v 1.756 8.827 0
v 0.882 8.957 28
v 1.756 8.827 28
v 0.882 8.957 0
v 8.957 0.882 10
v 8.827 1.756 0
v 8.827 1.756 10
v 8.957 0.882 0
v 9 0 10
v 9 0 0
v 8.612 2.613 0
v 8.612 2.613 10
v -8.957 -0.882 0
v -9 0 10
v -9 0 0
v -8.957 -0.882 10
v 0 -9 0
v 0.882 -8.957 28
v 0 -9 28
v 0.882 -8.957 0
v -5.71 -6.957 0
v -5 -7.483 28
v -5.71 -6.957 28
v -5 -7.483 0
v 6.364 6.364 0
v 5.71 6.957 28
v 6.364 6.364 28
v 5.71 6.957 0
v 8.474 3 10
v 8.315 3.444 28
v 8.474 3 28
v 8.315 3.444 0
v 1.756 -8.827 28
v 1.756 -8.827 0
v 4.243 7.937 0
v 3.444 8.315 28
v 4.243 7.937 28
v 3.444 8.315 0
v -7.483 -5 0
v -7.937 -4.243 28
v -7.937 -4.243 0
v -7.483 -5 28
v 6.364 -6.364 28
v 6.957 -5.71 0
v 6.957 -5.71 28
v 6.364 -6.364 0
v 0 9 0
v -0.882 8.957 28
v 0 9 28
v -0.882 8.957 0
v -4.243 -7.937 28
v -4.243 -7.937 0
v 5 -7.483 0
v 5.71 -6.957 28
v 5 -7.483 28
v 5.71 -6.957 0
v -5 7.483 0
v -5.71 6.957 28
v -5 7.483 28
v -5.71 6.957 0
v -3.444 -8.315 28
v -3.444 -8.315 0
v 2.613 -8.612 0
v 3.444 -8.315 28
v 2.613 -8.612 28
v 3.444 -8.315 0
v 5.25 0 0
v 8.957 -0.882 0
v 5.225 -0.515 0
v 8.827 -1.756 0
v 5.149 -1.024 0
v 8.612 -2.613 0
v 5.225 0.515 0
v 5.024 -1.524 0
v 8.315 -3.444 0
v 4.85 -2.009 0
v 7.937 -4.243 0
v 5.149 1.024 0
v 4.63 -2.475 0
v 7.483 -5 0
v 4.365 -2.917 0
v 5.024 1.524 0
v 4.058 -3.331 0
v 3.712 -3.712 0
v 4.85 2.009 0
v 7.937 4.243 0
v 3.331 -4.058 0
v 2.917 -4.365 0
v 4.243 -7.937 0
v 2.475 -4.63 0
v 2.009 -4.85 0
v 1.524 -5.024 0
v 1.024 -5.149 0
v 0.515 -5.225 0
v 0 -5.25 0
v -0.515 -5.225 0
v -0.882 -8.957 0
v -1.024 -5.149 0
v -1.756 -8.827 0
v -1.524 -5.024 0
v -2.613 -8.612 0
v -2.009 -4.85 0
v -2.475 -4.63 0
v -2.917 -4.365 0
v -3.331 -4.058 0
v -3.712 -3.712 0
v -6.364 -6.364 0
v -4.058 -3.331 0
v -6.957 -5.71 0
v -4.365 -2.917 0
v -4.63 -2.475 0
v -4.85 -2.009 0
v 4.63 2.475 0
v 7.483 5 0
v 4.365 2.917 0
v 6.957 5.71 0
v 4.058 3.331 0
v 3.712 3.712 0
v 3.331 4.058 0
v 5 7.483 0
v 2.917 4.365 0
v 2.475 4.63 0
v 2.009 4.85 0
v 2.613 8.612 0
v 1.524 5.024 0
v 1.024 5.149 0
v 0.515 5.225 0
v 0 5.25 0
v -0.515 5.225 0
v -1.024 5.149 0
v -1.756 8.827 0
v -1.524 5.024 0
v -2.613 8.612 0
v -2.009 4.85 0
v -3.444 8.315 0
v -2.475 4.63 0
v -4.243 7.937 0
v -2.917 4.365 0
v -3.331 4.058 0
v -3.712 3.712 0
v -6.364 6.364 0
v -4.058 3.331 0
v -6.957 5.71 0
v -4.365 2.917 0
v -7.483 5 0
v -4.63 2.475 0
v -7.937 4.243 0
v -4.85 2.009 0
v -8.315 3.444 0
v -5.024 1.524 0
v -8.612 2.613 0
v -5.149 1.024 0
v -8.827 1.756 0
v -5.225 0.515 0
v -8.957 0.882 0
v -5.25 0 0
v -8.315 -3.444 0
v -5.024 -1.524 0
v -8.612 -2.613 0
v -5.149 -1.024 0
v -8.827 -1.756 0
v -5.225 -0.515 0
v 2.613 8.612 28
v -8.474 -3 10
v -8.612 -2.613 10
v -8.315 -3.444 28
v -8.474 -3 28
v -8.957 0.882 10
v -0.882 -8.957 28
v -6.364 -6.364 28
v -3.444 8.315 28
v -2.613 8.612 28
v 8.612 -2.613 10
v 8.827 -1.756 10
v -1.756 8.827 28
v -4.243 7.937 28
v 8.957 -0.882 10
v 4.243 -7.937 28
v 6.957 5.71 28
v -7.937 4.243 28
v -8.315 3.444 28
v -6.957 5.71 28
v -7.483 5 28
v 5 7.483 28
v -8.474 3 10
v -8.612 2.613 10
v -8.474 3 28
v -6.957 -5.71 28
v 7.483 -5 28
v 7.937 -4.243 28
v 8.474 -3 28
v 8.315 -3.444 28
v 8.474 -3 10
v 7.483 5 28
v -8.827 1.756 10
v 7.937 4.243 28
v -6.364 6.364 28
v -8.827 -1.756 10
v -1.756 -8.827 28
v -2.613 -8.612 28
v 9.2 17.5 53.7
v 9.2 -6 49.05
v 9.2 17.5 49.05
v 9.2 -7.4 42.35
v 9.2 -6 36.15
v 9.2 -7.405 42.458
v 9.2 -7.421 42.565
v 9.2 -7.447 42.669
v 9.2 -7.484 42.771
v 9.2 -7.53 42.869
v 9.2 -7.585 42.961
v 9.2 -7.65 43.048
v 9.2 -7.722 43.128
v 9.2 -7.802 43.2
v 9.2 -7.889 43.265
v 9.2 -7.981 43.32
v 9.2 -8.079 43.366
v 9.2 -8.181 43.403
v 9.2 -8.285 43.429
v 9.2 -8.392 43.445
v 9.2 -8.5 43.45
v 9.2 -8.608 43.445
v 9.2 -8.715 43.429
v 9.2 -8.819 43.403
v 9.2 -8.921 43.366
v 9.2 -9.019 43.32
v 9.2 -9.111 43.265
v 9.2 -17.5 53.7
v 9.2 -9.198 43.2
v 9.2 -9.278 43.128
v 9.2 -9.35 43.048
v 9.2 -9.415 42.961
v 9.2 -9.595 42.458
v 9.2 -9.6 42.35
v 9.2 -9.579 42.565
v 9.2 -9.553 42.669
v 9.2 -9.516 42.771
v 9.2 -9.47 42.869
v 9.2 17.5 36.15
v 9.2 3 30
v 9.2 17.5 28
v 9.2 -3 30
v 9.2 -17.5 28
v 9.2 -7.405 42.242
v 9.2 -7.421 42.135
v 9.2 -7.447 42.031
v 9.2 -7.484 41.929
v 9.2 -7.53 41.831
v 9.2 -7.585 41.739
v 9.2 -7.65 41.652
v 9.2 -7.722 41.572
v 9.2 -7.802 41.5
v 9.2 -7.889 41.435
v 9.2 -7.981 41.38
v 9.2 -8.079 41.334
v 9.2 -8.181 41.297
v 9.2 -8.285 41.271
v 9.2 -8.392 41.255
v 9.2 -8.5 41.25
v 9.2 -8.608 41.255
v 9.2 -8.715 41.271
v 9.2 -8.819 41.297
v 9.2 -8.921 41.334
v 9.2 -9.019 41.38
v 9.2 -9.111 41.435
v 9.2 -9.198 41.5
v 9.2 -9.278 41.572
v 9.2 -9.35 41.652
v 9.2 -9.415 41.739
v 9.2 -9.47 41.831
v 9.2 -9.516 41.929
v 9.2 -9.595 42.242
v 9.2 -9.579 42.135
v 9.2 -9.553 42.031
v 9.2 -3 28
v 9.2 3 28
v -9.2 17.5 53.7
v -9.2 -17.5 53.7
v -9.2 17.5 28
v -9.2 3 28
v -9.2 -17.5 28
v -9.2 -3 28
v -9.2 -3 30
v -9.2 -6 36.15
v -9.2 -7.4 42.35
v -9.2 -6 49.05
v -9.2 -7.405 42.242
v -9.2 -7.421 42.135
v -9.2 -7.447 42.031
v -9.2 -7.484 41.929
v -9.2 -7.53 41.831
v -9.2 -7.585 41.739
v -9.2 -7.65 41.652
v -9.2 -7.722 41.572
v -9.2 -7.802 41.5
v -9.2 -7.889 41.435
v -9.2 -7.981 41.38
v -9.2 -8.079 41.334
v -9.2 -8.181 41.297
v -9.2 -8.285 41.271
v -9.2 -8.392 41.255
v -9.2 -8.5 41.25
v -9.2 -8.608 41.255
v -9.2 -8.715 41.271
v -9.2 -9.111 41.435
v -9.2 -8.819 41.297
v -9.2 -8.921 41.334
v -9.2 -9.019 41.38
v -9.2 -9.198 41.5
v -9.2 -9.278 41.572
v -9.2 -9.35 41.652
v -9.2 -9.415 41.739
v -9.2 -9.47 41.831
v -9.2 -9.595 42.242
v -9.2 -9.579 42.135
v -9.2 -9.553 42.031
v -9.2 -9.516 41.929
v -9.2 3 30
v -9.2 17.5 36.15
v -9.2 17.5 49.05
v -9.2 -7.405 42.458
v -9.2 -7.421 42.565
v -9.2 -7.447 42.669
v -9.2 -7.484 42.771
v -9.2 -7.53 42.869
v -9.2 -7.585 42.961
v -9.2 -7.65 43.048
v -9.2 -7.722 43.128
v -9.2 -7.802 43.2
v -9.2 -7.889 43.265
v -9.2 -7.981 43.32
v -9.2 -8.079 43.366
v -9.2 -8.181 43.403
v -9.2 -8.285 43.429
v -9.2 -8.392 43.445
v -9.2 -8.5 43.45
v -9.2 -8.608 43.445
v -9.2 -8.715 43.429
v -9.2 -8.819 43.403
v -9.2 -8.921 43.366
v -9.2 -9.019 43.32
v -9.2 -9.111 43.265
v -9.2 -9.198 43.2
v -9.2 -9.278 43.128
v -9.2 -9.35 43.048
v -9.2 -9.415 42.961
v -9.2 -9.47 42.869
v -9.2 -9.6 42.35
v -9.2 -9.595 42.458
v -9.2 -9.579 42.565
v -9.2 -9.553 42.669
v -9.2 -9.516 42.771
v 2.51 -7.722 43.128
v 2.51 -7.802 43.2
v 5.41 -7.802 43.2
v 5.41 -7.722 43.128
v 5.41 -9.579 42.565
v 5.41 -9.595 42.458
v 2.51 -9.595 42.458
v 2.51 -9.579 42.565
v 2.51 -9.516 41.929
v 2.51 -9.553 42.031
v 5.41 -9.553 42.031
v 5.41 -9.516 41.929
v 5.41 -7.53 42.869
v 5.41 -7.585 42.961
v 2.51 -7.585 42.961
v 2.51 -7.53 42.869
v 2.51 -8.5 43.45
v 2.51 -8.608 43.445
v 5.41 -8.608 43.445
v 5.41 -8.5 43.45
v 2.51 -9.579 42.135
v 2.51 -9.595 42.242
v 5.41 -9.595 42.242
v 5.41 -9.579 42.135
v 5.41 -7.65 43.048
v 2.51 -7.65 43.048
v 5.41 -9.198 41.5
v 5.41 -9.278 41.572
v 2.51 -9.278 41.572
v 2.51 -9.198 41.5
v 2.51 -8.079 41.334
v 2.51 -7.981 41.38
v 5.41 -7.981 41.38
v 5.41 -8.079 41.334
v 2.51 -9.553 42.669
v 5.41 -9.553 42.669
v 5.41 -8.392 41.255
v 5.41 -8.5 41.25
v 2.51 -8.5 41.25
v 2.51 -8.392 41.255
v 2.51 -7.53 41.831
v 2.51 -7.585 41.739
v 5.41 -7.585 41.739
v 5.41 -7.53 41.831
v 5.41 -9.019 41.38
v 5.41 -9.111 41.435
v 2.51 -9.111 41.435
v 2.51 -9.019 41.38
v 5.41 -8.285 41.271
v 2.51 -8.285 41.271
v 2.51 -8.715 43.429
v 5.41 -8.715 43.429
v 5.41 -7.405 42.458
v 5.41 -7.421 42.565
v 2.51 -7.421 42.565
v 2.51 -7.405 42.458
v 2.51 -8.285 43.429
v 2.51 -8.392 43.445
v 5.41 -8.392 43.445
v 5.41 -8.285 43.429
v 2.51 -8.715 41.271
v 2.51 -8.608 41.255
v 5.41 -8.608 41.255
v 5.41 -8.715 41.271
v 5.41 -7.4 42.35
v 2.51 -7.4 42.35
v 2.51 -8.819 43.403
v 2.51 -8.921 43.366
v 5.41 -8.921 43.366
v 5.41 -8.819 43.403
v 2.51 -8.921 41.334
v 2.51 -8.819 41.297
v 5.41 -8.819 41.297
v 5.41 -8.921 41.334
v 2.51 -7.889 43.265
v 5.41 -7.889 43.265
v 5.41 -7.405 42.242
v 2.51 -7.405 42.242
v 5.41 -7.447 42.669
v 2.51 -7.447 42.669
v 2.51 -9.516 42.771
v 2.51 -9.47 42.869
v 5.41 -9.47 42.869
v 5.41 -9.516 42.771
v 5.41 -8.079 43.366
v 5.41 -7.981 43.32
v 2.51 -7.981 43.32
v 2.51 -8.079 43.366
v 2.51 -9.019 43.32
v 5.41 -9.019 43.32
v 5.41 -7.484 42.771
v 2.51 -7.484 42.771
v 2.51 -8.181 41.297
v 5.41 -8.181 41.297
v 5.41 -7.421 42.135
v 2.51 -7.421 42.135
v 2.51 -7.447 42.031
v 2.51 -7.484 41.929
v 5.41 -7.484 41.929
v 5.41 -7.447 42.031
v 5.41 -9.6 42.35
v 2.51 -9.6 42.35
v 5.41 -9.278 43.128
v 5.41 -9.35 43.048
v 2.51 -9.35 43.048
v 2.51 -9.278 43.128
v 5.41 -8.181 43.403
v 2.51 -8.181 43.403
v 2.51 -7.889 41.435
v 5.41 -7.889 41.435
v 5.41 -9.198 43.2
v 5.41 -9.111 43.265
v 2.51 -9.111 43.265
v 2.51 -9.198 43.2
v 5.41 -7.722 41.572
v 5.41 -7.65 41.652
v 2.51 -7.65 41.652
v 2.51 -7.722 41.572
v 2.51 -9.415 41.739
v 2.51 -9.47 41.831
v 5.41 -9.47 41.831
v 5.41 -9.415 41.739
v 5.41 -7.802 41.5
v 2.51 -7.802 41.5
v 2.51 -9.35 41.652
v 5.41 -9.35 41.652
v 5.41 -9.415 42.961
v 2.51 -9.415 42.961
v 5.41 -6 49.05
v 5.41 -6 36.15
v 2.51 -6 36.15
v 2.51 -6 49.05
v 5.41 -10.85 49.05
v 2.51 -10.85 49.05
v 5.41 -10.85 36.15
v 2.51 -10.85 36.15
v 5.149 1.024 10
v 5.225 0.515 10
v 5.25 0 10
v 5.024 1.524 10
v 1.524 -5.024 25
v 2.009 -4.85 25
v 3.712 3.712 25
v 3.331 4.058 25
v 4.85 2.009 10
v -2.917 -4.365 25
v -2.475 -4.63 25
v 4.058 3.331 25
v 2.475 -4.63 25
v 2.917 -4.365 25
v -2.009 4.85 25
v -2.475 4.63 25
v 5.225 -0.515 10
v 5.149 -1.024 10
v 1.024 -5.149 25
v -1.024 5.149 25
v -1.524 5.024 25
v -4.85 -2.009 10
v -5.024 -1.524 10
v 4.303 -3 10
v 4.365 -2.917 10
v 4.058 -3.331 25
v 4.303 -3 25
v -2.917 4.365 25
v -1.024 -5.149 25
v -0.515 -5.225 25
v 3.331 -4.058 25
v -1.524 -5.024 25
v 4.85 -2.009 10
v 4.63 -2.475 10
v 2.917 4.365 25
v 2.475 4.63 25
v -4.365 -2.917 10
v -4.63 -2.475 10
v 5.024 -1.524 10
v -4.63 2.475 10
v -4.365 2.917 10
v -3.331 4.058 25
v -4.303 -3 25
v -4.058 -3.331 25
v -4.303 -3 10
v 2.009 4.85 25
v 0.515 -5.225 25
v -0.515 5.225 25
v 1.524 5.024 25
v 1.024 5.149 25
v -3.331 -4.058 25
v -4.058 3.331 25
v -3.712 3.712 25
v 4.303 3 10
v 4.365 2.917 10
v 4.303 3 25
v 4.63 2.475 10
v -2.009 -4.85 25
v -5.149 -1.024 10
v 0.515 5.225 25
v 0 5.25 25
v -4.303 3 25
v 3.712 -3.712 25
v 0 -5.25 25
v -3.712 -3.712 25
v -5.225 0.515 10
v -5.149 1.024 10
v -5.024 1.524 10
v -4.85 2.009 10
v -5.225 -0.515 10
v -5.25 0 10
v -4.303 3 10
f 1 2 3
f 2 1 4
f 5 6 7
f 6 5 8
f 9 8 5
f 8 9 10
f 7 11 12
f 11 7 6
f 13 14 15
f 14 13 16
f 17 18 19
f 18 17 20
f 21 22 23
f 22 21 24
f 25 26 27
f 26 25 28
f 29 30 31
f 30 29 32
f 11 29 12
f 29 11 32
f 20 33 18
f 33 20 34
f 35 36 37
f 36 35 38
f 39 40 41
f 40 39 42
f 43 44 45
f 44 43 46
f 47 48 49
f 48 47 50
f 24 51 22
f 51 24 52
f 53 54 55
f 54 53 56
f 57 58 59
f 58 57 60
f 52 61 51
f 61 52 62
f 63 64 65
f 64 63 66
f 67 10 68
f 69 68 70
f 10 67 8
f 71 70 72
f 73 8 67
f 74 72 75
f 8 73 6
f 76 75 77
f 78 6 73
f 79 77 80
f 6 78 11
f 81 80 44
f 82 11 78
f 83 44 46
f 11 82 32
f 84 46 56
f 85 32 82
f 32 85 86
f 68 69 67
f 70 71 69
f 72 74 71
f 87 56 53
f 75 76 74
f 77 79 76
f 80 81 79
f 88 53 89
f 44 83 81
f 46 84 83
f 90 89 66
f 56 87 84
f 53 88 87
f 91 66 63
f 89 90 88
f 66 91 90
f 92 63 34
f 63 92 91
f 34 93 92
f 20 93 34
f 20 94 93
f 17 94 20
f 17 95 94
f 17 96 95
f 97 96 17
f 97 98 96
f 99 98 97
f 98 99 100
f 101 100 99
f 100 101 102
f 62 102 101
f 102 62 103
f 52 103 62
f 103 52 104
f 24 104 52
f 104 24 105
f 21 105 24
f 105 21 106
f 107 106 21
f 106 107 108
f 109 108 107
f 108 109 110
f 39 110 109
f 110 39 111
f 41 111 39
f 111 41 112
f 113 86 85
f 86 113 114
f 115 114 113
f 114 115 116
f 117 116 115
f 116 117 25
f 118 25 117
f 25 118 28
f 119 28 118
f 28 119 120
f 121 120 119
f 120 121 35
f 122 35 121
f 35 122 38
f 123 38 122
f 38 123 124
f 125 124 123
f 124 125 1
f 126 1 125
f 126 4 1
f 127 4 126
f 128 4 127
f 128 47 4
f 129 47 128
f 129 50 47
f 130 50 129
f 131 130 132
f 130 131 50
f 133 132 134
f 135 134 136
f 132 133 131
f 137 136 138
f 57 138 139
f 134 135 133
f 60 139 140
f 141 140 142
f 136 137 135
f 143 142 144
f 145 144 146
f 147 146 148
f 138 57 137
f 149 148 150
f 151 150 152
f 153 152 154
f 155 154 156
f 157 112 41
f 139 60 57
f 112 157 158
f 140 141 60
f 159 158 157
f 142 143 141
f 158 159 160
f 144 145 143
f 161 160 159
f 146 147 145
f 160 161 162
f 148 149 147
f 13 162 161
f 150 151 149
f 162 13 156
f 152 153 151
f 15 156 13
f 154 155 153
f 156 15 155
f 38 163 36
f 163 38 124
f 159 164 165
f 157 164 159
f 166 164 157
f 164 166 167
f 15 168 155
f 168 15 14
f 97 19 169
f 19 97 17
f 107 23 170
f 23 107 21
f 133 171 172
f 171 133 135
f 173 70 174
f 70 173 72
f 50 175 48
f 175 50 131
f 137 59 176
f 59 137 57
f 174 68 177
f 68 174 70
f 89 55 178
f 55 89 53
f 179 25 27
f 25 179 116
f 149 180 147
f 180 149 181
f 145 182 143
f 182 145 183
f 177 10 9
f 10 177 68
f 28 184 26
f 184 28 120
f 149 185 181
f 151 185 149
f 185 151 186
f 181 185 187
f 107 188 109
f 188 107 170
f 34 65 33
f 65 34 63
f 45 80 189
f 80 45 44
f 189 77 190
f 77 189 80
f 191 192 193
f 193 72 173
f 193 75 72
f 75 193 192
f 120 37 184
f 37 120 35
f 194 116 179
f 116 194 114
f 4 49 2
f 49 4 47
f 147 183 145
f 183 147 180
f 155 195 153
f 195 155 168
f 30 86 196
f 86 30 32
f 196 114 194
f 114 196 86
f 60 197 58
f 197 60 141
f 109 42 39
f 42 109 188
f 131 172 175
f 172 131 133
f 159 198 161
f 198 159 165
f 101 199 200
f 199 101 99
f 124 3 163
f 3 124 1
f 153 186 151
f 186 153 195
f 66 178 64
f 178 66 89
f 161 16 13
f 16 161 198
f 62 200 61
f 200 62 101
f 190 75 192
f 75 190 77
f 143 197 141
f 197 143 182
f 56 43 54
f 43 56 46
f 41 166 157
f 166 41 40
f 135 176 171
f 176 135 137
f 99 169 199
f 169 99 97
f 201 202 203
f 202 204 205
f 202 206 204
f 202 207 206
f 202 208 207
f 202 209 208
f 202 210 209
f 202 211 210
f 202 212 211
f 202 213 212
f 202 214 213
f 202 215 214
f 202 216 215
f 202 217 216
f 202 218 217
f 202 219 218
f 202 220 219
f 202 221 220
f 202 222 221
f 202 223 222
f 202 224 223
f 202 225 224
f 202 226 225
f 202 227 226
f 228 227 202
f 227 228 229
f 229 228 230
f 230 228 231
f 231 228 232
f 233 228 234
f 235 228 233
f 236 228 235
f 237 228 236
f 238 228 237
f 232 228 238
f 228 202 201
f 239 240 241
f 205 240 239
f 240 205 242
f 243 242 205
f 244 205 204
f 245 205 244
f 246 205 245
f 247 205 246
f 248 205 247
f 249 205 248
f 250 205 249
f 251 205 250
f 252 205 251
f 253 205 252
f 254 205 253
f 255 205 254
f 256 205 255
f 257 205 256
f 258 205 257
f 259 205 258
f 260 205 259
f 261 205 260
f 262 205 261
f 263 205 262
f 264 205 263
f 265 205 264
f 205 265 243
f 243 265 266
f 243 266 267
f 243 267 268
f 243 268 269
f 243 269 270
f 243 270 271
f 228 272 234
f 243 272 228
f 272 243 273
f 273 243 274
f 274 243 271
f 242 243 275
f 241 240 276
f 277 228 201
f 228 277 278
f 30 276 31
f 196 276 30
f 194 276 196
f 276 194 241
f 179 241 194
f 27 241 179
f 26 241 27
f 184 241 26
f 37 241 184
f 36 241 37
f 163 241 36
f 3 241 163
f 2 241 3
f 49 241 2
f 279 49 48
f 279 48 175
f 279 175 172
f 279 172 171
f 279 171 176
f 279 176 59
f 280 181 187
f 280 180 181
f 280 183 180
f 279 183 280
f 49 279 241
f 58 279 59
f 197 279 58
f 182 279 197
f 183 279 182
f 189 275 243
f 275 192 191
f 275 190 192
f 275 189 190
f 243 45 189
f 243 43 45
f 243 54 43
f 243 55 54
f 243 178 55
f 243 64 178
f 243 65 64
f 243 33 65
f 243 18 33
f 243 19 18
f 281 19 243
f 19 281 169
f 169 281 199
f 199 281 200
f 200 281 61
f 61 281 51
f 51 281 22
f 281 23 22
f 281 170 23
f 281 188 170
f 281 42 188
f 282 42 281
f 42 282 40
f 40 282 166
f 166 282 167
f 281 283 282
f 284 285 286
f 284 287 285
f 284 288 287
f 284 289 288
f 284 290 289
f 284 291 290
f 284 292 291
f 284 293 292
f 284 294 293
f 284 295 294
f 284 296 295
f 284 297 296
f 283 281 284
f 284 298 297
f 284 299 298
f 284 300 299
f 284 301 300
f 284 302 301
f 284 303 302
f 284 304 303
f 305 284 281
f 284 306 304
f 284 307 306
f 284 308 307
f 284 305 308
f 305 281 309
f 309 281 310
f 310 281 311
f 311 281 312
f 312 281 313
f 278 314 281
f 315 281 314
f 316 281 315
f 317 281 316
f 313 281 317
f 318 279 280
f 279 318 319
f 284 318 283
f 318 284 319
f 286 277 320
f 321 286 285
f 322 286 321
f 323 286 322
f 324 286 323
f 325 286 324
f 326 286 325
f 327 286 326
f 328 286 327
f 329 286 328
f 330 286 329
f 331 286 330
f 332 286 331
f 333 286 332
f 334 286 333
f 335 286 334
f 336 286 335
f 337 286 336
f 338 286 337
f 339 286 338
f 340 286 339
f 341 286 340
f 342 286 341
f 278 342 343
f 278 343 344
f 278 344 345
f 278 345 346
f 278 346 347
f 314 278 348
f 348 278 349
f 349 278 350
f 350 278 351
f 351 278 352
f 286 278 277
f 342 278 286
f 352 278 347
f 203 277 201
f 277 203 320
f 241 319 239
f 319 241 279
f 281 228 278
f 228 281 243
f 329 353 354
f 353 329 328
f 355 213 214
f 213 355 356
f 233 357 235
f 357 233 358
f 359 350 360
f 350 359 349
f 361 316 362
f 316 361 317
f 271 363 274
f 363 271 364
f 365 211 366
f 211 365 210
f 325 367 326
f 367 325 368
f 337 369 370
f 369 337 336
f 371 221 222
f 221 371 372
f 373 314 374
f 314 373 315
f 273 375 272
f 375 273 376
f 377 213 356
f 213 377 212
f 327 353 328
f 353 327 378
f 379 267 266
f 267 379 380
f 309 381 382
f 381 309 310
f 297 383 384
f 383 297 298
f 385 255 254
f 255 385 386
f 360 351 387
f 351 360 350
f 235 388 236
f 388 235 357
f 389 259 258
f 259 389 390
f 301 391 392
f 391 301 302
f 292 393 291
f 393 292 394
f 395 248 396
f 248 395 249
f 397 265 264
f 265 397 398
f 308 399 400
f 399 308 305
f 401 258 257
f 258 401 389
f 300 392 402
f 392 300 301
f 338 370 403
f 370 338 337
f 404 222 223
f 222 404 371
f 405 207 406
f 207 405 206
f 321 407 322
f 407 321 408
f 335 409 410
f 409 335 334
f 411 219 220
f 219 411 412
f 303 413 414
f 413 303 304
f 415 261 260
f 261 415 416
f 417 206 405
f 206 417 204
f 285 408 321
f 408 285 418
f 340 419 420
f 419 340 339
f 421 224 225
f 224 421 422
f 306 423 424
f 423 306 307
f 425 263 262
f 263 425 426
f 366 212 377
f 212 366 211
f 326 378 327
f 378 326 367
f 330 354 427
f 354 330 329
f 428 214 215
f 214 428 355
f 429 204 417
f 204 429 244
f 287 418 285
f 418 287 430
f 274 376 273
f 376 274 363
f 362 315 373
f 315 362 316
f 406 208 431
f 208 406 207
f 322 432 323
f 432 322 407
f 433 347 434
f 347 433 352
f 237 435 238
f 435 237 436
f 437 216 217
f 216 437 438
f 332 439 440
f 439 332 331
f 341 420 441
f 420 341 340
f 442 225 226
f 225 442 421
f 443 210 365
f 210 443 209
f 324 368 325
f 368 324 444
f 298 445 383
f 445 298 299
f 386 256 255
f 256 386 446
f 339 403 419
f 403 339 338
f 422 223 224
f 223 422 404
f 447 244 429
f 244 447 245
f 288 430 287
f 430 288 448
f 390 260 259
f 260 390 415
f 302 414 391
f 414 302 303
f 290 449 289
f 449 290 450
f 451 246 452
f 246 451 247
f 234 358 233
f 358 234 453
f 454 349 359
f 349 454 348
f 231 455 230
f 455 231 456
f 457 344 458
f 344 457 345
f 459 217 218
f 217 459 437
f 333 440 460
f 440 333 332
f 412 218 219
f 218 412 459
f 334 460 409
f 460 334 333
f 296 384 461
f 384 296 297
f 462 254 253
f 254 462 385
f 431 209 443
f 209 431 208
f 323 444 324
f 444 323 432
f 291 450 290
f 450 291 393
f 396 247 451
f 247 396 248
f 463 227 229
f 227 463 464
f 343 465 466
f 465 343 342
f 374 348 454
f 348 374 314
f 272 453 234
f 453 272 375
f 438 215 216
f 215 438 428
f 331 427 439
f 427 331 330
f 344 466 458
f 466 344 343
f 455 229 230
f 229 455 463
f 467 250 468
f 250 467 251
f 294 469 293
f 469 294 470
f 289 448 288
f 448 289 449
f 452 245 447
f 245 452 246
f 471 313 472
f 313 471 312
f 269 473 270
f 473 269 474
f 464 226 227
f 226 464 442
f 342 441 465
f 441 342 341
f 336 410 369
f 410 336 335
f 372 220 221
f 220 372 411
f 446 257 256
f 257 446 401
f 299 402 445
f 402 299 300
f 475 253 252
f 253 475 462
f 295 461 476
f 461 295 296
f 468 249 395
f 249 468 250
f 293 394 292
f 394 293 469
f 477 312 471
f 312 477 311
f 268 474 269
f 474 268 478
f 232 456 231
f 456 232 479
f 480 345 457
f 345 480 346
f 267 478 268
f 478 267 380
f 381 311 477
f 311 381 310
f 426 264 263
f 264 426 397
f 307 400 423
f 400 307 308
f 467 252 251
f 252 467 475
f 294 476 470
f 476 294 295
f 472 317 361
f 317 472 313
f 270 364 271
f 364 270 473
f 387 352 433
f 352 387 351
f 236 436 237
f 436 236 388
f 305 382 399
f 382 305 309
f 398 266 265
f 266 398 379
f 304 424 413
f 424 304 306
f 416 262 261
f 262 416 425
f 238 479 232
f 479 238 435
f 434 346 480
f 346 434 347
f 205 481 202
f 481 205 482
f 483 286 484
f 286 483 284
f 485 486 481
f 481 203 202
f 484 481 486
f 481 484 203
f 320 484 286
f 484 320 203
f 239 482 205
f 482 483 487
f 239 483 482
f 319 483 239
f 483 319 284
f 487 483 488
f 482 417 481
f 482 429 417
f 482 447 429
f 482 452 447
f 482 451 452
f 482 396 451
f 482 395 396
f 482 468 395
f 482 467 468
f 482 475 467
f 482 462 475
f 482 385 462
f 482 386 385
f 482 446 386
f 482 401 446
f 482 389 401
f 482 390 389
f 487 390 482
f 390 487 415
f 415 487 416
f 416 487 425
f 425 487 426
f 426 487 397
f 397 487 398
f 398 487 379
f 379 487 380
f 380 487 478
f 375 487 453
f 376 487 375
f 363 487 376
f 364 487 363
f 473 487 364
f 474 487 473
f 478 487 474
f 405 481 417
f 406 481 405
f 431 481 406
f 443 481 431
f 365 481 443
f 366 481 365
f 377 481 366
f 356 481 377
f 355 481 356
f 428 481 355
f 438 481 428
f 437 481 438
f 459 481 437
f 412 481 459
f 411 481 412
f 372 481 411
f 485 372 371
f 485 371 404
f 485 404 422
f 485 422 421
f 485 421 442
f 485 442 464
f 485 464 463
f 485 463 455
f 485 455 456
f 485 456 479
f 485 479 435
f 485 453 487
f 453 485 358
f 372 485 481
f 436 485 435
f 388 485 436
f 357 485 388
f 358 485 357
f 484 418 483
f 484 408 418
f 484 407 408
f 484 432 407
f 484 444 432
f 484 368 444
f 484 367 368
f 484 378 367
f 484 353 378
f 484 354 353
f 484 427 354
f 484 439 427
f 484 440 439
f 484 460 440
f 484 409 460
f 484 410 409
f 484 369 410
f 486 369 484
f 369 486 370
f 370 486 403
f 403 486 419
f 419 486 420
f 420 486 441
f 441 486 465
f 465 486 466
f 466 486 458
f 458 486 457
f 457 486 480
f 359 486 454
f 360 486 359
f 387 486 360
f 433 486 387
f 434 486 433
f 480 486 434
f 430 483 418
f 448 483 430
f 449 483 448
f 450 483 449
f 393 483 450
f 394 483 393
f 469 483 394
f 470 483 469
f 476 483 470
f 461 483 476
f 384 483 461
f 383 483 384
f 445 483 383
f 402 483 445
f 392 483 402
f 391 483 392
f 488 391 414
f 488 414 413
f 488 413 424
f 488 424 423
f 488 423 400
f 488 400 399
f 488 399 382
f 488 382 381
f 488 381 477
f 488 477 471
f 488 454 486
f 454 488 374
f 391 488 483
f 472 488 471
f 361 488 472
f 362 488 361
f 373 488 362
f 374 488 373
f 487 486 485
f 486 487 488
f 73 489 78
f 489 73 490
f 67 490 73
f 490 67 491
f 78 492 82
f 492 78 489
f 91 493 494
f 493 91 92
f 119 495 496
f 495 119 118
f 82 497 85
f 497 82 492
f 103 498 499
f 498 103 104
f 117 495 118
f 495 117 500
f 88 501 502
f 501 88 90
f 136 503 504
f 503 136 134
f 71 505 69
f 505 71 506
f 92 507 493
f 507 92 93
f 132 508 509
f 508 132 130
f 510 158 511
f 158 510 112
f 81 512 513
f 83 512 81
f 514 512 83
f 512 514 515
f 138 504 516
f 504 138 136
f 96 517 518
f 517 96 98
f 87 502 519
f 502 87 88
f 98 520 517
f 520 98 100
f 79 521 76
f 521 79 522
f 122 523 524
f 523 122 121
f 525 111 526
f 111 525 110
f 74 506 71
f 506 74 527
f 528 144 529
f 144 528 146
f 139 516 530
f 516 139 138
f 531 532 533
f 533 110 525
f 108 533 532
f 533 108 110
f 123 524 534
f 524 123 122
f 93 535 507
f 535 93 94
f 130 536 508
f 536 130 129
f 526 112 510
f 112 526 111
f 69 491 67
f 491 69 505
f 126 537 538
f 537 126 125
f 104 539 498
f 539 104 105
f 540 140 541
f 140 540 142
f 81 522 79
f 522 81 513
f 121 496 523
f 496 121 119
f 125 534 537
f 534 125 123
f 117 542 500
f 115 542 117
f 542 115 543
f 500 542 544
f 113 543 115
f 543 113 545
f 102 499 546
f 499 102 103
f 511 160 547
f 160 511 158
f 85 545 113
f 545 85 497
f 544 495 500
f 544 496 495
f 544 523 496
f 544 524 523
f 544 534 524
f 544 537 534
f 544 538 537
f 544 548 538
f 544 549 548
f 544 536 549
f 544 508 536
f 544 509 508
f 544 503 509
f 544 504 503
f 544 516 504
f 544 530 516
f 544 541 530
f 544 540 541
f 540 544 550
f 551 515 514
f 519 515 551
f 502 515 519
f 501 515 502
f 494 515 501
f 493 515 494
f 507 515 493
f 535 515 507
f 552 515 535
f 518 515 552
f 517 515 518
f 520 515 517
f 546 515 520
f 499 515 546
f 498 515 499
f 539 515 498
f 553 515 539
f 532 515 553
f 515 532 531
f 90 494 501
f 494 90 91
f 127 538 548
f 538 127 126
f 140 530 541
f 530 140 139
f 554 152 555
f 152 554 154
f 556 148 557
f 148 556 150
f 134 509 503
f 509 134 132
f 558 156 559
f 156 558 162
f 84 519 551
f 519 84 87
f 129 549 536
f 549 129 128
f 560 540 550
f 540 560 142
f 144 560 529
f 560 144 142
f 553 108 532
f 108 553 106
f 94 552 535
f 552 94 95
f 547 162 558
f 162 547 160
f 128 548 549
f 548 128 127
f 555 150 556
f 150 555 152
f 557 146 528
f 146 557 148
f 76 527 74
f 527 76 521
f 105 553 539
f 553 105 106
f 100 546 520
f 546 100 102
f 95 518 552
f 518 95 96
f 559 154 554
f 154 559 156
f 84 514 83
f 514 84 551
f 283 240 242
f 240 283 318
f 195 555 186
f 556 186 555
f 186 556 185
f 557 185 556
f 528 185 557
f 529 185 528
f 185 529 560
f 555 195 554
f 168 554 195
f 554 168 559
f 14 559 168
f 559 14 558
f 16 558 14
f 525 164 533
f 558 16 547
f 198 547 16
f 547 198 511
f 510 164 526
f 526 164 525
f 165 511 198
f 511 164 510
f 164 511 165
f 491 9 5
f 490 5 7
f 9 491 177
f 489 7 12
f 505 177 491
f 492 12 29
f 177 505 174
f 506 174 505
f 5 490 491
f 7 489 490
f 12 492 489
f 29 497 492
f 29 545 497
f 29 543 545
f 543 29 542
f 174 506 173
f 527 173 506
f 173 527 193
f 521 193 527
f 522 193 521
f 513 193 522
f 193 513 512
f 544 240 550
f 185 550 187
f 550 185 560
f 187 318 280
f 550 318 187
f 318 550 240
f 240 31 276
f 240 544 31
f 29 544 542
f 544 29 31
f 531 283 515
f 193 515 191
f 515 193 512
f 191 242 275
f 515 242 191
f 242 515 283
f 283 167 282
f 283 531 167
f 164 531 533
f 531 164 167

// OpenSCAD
// file: params.scad
// ============================================================================
// Ombrellone magico - mini prototipo 1:10 - parametri condivisi (mm)
// Apri i singoli file con OpenSCAD (https://openscad.org), F6 e esporta STL.
// ============================================================================
$fn = 64;

// --- geometria del modello (scala 1:10 del progetto base) ------------------
pole_h      = 200;    // altezza palo fisso (dalla base alla cerniera di inclinazione)
arm_l       = 160;    // lunghezza braccio (dalla cerniera al centro testa)
canopy_r    = 150;    // raggio tettuccio
canopy_off  = 50;     // sbalzo del tettuccio lungo il braccio (fisso nel mini)

// --- tubi in carbonio (aste da aquilone) -----------------------------------
pole_tube_d = 10;     // diametro esterno tubo palo
arm_tube_d  = 8;      // diametro esterno tubo braccio
spoke_d     = 2;      // stecche tettuccio
fit         = 0.25;   // gioco per gli accoppiamenti stampati (0.2-0.35 a seconda della stampante)

// --- servo ------------------------------------------------------------------
// MG996R / DS3218 (standard): corpo 40.5 x 20 x 38 mm, flangia 54.5 mm, fori a 49 mm
sv_std_l = 40.7; sv_std_w = 20.2; sv_std_h = 38; sv_std_tab = 54.7; sv_std_hole = 49; sv_std_tab_t = 2.6;
// SG90 / MG90S (micro): corpo 22.8 x 12.2 x 22.5 mm, flangia 32.5 mm, fori a 28 mm
sv_mic_l = 23.0; sv_mic_w = 12.4; sv_mic_h = 22.7; sv_mic_tab = 32.7; sv_mic_hole = 28; sv_mic_tab_t = 2.4;
horn_std_d = 21;      // squadretta rotonda MG996R
horn_mic_d = 20;      // squadretta rotonda SG90 (a croce: 20 mm)

// --- cuscinetto ralla (lazy susan) ------------------------------------------
turntable_d = 300;    // disco piattaforma demo (compensato/forex 5 mm, tagliato a mano)
bearing_d   = 200;    // lazy susan 200 mm

wall = 3;

// tasca per servo standard (asse Z verso l'alto, albero in origine)
module servo_std_pocket(extra=10) {
    translate([-sv_std_l/2 + 10 - 1, -sv_std_w/2, -sv_std_h]) cube([sv_std_l + fit*2, sv_std_w + fit*2, sv_std_h + extra]);
    // flange
    translate([-sv_std_tab/2 + 10 - 1, -sv_std_w/2, -sv_std_h + 27]) cube([sv_std_tab, sv_std_w + fit*2, sv_std_tab_t + 0.5]);
    for (x = [-sv_std_hole/2, sv_std_hole/2]) translate([x + 10 - 1, 0, -sv_std_h]) cylinder(d = 3.2, h = sv_std_h + extra);
}
// tasca per micro servo (asse Z verso l'alto, albero in origine: l'albero e' a 6 mm da un'estremita')
module servo_mic_pocket(extra=10) {
    translate([-sv_mic_l/2 + 5.5, -sv_mic_w/2, -sv_mic_h]) cube([sv_mic_l + fit*2, sv_mic_w + fit*2, sv_mic_h + extra]);
    translate([-sv_mic_tab/2 + 5.5, -sv_mic_w/2, -sv_mic_h + 16]) cube([sv_mic_tab, sv_mic_w + fit*2, sv_mic_tab_t + 0.5]);
    for (x = [-sv_mic_hole/2, sv_mic_hole/2]) translate([x + 5.5, 0, -sv_mic_h]) cylinder(d = 2.2, h = sv_mic_h + extra);
}
// main file
// Cima del palo: tappo per il tubo + tasca per il micro servo di INCLINAZIONE
// (MG90S), con l'albero orizzontale.  L'asse dell'albero e' la cerniera theta.
include <params.scad>

module pole_top() {
    difference() {
        union() {
            cylinder(d=pole_tube_d+2*wall+2, h=30);                 // manicotto sul tubo
            translate([-sv_mic_w/2-wall, -sv_mic_l/2-6, 28]) cube([sv_mic_w+2*wall, sv_mic_l+12, sv_mic_h+wall]);
        }
        translate([0,0,-1]) cylinder(d=pole_tube_d+fit*2, h=26);    // tubo palo
        // servo con albero lungo X (orizzontale): ruoto la tasca
        translate([0, 0, 28+sv_mic_h/2+wall]) rotate([0,90,0]) translate([0,0,sv_mic_w/2+wall+0.01]) rotate([0,0,90]) servo_mic_pocket(extra=10);
        translate([-sv_mic_w/2-wall-1, -3, 10]) cube([sv_mic_w+2*wall+2, 6, 20]); // passaggio cavo
    }
}
pole_top();
